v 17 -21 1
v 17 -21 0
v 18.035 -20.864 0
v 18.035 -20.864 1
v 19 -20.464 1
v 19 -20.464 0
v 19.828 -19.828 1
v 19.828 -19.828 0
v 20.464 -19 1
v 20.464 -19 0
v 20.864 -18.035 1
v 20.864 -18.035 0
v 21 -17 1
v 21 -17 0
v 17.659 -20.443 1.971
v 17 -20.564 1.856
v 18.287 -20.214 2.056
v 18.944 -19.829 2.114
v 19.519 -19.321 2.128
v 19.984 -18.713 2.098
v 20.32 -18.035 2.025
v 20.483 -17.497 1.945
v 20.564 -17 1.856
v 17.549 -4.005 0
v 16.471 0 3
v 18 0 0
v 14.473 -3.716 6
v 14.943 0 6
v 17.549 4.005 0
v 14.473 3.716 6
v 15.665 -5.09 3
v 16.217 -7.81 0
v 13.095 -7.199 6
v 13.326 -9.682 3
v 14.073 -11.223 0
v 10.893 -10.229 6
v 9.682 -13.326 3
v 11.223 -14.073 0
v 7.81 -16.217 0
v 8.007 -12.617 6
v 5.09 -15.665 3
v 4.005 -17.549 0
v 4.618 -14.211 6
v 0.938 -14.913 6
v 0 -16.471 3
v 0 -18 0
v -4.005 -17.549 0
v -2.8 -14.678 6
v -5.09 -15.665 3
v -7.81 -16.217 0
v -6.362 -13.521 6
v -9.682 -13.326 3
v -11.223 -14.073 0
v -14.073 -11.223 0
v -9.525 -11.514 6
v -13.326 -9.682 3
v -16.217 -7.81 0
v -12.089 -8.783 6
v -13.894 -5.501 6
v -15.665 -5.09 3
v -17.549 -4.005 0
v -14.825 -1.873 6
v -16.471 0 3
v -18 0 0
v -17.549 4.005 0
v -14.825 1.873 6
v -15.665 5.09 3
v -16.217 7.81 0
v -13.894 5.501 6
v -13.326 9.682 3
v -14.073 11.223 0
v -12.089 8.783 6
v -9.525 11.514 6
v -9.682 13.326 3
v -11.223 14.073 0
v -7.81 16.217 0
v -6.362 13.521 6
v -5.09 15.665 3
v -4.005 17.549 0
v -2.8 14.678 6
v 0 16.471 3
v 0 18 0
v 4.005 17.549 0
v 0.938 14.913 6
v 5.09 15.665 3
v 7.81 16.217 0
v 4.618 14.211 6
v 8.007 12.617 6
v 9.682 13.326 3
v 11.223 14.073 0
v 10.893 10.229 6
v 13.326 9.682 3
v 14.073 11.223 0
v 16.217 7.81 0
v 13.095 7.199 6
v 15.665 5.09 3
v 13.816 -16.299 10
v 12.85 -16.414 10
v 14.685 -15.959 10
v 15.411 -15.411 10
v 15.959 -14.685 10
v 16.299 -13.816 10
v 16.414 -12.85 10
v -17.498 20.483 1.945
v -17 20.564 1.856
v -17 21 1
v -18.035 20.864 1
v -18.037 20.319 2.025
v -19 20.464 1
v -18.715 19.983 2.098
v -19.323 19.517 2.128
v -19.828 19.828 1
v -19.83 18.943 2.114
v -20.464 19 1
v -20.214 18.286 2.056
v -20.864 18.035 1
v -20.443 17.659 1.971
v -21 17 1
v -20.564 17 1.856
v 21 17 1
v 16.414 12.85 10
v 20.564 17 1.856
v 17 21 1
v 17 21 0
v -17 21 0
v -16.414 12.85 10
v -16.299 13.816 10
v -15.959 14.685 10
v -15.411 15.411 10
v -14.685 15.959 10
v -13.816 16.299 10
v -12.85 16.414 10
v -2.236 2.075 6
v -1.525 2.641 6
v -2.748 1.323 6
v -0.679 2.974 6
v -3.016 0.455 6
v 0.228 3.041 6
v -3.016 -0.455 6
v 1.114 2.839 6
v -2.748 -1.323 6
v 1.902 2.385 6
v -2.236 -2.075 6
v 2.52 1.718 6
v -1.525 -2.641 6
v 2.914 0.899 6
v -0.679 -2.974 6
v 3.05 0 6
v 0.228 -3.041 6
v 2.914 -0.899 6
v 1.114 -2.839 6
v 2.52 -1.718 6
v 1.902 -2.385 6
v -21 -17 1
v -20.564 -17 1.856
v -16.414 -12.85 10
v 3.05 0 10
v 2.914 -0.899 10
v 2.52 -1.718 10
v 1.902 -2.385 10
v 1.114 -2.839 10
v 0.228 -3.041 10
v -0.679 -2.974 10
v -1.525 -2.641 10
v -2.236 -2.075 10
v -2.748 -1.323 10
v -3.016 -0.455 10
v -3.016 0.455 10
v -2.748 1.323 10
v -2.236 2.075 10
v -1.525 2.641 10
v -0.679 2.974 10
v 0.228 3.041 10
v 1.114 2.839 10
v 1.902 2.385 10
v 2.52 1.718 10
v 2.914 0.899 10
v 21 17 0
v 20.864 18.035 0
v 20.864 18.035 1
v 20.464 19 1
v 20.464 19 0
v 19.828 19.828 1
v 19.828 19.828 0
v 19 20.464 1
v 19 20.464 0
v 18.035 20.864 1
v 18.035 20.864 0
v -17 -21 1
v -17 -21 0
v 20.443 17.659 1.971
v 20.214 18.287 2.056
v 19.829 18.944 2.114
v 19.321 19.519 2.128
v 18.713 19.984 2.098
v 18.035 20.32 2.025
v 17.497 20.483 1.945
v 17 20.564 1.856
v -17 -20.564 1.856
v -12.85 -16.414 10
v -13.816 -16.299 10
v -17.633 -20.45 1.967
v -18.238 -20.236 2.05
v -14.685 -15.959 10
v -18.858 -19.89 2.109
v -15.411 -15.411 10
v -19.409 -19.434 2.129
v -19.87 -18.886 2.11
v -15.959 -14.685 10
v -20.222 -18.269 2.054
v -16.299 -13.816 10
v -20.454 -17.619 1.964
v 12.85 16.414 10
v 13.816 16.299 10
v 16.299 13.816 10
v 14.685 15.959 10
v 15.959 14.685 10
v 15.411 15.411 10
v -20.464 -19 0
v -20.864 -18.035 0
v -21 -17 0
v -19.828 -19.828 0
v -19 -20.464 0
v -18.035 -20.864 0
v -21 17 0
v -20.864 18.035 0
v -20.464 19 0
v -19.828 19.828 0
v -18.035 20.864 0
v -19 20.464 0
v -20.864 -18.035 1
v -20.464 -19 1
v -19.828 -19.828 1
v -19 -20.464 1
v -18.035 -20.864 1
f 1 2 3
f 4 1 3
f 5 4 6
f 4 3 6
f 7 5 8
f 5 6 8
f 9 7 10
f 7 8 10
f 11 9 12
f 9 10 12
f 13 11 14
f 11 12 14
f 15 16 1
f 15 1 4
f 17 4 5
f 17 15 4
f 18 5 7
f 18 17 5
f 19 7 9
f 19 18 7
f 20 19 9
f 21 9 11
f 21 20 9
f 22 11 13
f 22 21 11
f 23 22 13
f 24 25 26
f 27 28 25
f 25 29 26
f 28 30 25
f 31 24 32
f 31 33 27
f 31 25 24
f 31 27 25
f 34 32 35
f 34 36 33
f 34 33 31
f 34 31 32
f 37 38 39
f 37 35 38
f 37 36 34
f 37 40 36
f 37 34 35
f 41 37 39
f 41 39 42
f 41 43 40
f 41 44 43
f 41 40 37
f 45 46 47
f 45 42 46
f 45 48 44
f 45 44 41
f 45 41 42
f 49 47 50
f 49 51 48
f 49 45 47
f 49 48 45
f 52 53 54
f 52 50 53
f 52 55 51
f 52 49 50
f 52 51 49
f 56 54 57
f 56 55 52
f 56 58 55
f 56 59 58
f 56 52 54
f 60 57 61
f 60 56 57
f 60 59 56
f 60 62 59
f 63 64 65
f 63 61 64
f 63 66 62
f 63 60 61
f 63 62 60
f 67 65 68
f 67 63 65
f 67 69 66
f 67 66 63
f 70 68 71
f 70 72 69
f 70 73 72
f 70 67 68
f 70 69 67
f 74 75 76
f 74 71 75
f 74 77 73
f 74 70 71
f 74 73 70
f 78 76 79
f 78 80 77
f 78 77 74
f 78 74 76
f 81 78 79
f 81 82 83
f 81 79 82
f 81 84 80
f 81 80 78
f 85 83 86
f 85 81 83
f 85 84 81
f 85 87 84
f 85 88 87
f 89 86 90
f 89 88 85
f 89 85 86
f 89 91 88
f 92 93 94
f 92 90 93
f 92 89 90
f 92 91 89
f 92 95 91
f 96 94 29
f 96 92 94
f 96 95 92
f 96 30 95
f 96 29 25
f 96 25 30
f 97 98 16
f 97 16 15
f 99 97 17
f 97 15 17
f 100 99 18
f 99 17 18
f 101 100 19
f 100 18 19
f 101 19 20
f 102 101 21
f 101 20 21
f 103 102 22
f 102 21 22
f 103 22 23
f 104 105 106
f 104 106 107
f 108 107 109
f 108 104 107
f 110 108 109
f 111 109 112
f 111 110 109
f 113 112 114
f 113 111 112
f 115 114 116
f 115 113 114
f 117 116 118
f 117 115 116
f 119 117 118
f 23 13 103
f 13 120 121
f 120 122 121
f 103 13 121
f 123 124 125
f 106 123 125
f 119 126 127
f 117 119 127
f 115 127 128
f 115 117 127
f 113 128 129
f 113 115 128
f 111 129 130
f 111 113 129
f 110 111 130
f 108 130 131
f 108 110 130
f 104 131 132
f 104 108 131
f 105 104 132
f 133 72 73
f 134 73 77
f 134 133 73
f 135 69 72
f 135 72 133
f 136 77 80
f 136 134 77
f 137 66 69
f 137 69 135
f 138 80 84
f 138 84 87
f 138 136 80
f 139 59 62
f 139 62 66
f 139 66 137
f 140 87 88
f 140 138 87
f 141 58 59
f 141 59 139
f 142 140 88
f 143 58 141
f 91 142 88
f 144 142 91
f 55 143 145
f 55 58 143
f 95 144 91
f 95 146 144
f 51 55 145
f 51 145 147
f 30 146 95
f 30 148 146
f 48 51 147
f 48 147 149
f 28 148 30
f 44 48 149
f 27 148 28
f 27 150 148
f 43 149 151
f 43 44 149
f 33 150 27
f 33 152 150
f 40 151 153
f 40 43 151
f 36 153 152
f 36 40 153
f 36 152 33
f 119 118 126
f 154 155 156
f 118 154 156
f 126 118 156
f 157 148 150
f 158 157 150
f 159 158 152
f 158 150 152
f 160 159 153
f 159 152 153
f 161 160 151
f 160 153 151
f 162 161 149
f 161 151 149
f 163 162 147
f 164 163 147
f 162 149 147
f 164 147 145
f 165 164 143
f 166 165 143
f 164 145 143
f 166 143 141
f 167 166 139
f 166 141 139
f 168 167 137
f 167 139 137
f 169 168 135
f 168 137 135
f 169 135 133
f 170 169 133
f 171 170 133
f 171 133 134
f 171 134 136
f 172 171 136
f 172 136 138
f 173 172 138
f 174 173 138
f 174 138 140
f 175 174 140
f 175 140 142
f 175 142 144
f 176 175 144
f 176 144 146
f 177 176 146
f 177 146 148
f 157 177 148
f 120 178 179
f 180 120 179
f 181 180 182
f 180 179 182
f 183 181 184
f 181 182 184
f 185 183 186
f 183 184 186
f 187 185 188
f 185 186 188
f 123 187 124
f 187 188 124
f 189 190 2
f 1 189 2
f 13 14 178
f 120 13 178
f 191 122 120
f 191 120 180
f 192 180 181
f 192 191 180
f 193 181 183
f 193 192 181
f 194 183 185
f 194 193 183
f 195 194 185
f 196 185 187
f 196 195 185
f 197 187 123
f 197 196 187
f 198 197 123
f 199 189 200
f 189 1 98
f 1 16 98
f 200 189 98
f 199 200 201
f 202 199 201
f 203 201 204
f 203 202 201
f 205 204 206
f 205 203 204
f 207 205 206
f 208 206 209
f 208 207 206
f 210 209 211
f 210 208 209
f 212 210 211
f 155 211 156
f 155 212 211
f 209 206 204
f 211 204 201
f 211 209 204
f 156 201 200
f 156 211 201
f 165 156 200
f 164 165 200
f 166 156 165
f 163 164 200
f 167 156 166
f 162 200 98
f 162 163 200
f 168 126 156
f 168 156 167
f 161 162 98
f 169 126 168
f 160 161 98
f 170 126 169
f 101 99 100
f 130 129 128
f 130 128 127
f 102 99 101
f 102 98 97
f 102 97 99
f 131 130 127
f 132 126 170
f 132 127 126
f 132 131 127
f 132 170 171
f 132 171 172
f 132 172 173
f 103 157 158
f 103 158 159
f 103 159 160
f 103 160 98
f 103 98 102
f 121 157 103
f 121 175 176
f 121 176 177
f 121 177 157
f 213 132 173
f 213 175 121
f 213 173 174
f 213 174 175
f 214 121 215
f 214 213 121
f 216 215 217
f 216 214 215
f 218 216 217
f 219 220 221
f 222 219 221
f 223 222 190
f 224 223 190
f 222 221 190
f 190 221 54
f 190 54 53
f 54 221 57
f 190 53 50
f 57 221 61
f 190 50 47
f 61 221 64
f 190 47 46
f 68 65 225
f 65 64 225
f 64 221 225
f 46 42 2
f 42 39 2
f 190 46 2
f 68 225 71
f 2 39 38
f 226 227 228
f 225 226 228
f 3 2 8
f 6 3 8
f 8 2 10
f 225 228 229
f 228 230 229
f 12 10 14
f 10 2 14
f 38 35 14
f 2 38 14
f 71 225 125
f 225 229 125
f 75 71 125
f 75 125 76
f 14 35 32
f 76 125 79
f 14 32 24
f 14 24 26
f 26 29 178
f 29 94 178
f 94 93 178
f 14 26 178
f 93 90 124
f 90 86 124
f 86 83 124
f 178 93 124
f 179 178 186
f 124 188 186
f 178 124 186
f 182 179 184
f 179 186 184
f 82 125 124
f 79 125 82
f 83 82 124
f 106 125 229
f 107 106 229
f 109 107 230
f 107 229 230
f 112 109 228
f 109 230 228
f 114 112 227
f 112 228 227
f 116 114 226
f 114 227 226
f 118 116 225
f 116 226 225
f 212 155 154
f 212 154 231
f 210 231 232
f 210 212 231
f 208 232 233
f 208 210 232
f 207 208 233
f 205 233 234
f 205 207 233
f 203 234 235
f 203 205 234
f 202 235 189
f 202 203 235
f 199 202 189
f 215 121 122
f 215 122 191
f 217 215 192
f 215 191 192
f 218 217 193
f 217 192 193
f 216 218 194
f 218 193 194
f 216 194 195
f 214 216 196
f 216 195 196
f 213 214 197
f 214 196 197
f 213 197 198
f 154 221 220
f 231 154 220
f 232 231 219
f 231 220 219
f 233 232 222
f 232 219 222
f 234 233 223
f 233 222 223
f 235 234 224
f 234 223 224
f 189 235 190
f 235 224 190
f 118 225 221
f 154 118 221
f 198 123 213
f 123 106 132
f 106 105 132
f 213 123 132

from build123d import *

# Parameters (mm, degrees)
F1_DEPTH    = 1
F2_DEPTH    = 9
F2_TAPER    = 27
F3_T1_DEPTH = 17.6431556895
F3_T3_DEPTH = 17.6431556895
F3_T5_DEPTH = 17.6431556895
F3_T7_DEPTH = 17.6431556895
F4_R        = 18
F5_DEPTH    = 6
F5_TAPER    = 27
F6_R        = 3.05
F7_DEPTH    = 4.0010001


# Not quite as in the source:
# - a fillet or chamfer that OpenCascade refuses, or shapes differently, is made with other operations: its cross-section is extruded or revolved along the edge and cut away or added


with BuildPart() as f1:
    # F0 (on Top) → F1 (new body)
    with BuildSketch(Plane.XY):
        with BuildLine():
            Line((-17, -21), (17, -21))
            ThreePointArc((17, -21), (19.8284271247, -19.8284271247), (21, -17))
            Line((21, -17), (21, 17))
            ThreePointArc((21, 17), (19.8284271247, 19.8284271247), (17, 21))
            Line((17, 21), (-17, 21))
            ThreePointArc((-17, 21), (-19.8284271247, 19.8284271247), (-21, 17))
            Line((-21, 17), (-21, -17))
            ThreePointArc((-21, -17), (-19.8284271247, -19.8284271247), (-17, -21))
        make_face()
    extrude(amount=F1_DEPTH)

    # F1_face (on face) → F2 (join)
    with BuildSketch(Plane.XY.offset(1)):
        with BuildLine():
            Line((-17, -21), (17, -21))
            ThreePointArc((17, -21), (19.8284271247, -19.8284271247), (21, -17))
            Line((21, -17), (21, 17))
            ThreePointArc((21, 17), (19.8284271247, 19.8284271247), (17, 21))
            Line((17, 21), (-17, 21))
            ThreePointArc((-17, 21), (-19.8284271247, 19.8284271247), (-21, 17))
            Line((-21, 17), (-21, -17))
            ThreePointArc((-21, -17), (-19.8284271247, -19.8284271247), (-17, -21))
        make_face()
    extrude(amount=F2_DEPTH, taper=F2_TAPER)

    # F3: fillet of radius 4 on 4 edges, made by hand

    # F3_s2 → F3_t1 (cut)
    with BuildSketch(Plane(origin=(-6.1956825311, -6.1956825311, -12.1597116243), x_dir=(-0.7071067812, 0.7071067812, 0), z_dir=(0.4133841097, 0.4133841097, 0.8113119965))):
        with BuildLine():
            ThreePointArc((-2.5201470213, 22.6347249075), (0, 23.5284636515), (2.5201470213, 22.6347249075))
            Line((2.5201470213, 22.6347249075), (0, 24.6793504189))
            Line((0, 24.6793504189), (-2.5201470213, 22.6347249075))
        make_face()
    extrude(amount=F3_T1_DEPTH, mode=Mode.SUBTRACT)

    # F3_s4 → F3_t3 (cut)
    with BuildSketch(Plane(origin=(6.1956825311, -6.1956825311, -12.1597116243), x_dir=(-0.7071067812, -0.7071067812, 0), z_dir=(-0.4133841097, 0.4133841097, 0.8113119965))):
        with BuildLine():
            ThreePointArc((2.5201470213, 22.6347249075), (0, 23.5284636515), (-2.5201470213, 22.6347249075))
            Line((-2.5201470213, 22.6347249075), (0, 24.6793504189))
            Line((0, 24.6793504189), (2.5201470213, 22.6347249075))
        make_face()
    extrude(amount=F3_T3_DEPTH, mode=Mode.SUBTRACT)

    # F3_s6 → F3_t5 (cut)
    with BuildSketch(Plane(origin=(-6.1956825311, 6.1956825311, -12.1597116243), x_dir=(0.7071067812, 0.7071067812, 0), z_dir=(0.4133841097, -0.4133841097, 0.8113119965))):
        with BuildLine():
            ThreePointArc((-2.5201470213, 22.6347249075), (0, 23.5284636515), (2.5201470213, 22.6347249075))
            Line((2.5201470213, 22.6347249075), (0, 24.6793504189))
            Line((0, 24.6793504189), (-2.5201470213, 22.6347249075))
        make_face()
    extrude(amount=F3_T5_DEPTH, mode=Mode.SUBTRACT)

    # F3_s8 → F3_t7 (cut)
    with BuildSketch(Plane(origin=(6.1956825311, 6.1956825311, -12.1597116243), x_dir=(0.7071067812, -0.7071067812, 0), z_dir=(-0.4133841097, -0.4133841097, 0.8113119965))):
        with BuildLine():
            ThreePointArc((2.5201470213, 22.6347249075), (0, 23.5284636515), (-2.5201470213, 22.6347249075))
            Line((-2.5201470213, 22.6347249075), (0, 24.6793504189))
            Line((0, 24.6793504189), (2.5201470213, 22.6347249075))
        make_face()
    extrude(amount=F3_T7_DEPTH, mode=Mode.SUBTRACT)

    # F4 (on face) → F5 (cut)
    with BuildSketch(Plane(origin=(0, 0, 0), x_dir=(1, 0, 0), z_dir=(0, 0, -1))):
        Circle(F4_R)
    extrude(amount=-F5_DEPTH, taper=F5_TAPER, mode=Mode.SUBTRACT)

    # F6 (on face) → F7 (cut, through all)
    with BuildSketch(Plane(origin=(0, 0, 6), x_dir=(1, 0, 0), z_dir=(0, 0, -1))):
        Circle(F6_R)
    extrude(amount=-F7_DEPTH, mode=Mode.SUBTRACT)


solid = f1.part
